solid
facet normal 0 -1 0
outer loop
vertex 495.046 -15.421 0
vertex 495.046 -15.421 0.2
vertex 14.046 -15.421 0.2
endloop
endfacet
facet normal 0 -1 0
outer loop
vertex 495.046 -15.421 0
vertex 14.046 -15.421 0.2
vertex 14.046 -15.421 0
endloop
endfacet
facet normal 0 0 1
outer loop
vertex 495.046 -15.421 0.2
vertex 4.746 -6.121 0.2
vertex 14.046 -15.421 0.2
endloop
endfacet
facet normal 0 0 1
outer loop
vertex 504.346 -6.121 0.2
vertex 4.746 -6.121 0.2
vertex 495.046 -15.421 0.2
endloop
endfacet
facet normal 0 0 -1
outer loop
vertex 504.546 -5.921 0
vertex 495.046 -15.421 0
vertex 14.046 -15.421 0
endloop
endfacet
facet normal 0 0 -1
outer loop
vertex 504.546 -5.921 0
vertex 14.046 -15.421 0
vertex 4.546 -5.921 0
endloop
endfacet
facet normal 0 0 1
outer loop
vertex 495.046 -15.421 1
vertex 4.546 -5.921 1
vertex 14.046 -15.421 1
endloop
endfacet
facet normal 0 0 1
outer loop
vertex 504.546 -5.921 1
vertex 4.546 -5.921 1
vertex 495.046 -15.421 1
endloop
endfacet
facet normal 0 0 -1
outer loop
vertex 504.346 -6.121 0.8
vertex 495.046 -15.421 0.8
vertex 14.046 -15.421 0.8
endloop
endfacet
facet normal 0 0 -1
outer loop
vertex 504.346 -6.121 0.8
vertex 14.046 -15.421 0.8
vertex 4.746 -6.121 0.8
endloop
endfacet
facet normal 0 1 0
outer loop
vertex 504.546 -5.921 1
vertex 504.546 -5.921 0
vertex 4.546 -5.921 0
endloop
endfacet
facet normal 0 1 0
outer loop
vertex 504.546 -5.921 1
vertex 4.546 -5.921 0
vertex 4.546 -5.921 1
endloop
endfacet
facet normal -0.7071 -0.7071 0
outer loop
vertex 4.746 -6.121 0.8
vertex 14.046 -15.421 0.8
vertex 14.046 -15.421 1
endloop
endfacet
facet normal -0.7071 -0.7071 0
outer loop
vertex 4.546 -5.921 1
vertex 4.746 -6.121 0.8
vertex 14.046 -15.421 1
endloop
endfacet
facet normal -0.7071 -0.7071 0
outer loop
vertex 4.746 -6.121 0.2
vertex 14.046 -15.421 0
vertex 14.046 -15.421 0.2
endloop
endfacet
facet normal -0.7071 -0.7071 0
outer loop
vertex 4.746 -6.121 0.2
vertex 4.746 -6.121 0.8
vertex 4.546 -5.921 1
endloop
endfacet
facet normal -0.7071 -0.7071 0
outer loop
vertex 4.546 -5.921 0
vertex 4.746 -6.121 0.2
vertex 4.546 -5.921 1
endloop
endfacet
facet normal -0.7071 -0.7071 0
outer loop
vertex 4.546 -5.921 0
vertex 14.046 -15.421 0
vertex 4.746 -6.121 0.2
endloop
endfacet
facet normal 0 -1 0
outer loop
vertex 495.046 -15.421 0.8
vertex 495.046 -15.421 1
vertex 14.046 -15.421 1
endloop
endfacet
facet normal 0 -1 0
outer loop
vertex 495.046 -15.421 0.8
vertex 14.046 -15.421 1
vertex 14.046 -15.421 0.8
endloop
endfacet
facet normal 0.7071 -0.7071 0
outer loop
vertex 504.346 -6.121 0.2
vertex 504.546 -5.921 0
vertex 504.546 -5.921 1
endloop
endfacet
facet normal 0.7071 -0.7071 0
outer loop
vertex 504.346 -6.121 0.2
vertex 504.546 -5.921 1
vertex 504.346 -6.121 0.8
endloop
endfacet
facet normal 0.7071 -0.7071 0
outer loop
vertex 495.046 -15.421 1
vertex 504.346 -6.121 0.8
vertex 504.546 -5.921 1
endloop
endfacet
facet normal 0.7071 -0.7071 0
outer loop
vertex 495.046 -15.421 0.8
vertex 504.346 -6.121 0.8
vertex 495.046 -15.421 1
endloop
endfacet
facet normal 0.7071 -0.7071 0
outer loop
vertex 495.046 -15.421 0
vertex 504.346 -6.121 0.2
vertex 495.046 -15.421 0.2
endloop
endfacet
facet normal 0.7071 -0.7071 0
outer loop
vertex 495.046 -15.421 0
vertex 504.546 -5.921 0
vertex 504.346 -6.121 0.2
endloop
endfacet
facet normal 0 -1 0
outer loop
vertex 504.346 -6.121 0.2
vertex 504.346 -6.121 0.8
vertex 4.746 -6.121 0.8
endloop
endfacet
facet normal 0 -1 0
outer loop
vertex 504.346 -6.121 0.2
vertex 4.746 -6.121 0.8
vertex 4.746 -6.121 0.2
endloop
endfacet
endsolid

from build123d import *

# Parameters (mm, degrees)
PAD052_DEPTH            = 500
POCKET004_DEPTH         = 1.001
POCKET005_DEPTH         = 1.001
BODY053_PITCH_ANGLE     = -90
BODY053_PLACEMENT_ANGLE = -90


with BuildPart() as part:
    # Sketch061 → Pad052 (new body)
    with BuildSketch(Plane.XZ):
        Polygon((0, 0), (0, 9.5), (1, 9.5), (1, 0), (0.8, 0), (0.8, 9.3), (0.2, 9.3), (0.2, 0), align=None)
    extrude(amount=PAD052_DEPTH)

    # Sketch060 → Pocket004 (cut, through all)
    with BuildSketch(Plane.YZ):
        Polygon((0, 0), (0, 9.5), (-9.5, 0), align=None)
    extrude(amount=POCKET004_DEPTH, mode=Mode.SUBTRACT)

    # Sketch062 → Pocket005 (cut, through all)
    with BuildSketch(Plane.YZ):
        Polygon((-500, 0), (-490.5, 0), (-500, 9.5), align=None)
    extrude(amount=POCKET005_DEPTH, mode=Mode.SUBTRACT)


with BuildPart() as part_1:
    # Body053 pitch: moved
    add(part.part.rotate(Axis((0, 0, 0), (0, 1, 0)), BODY053_PITCH_ANGLE))


with BuildPart() as part_2:
    # Body053 placement: moved
    add(part_1.part.moved(Location((504.546315, -15.421231, 0))).rotate(Axis((504.546315, -15.421231, 0), (0, 0, 1)), BODY053_PLACEMENT_ANGLE))


solid = part_2.part
